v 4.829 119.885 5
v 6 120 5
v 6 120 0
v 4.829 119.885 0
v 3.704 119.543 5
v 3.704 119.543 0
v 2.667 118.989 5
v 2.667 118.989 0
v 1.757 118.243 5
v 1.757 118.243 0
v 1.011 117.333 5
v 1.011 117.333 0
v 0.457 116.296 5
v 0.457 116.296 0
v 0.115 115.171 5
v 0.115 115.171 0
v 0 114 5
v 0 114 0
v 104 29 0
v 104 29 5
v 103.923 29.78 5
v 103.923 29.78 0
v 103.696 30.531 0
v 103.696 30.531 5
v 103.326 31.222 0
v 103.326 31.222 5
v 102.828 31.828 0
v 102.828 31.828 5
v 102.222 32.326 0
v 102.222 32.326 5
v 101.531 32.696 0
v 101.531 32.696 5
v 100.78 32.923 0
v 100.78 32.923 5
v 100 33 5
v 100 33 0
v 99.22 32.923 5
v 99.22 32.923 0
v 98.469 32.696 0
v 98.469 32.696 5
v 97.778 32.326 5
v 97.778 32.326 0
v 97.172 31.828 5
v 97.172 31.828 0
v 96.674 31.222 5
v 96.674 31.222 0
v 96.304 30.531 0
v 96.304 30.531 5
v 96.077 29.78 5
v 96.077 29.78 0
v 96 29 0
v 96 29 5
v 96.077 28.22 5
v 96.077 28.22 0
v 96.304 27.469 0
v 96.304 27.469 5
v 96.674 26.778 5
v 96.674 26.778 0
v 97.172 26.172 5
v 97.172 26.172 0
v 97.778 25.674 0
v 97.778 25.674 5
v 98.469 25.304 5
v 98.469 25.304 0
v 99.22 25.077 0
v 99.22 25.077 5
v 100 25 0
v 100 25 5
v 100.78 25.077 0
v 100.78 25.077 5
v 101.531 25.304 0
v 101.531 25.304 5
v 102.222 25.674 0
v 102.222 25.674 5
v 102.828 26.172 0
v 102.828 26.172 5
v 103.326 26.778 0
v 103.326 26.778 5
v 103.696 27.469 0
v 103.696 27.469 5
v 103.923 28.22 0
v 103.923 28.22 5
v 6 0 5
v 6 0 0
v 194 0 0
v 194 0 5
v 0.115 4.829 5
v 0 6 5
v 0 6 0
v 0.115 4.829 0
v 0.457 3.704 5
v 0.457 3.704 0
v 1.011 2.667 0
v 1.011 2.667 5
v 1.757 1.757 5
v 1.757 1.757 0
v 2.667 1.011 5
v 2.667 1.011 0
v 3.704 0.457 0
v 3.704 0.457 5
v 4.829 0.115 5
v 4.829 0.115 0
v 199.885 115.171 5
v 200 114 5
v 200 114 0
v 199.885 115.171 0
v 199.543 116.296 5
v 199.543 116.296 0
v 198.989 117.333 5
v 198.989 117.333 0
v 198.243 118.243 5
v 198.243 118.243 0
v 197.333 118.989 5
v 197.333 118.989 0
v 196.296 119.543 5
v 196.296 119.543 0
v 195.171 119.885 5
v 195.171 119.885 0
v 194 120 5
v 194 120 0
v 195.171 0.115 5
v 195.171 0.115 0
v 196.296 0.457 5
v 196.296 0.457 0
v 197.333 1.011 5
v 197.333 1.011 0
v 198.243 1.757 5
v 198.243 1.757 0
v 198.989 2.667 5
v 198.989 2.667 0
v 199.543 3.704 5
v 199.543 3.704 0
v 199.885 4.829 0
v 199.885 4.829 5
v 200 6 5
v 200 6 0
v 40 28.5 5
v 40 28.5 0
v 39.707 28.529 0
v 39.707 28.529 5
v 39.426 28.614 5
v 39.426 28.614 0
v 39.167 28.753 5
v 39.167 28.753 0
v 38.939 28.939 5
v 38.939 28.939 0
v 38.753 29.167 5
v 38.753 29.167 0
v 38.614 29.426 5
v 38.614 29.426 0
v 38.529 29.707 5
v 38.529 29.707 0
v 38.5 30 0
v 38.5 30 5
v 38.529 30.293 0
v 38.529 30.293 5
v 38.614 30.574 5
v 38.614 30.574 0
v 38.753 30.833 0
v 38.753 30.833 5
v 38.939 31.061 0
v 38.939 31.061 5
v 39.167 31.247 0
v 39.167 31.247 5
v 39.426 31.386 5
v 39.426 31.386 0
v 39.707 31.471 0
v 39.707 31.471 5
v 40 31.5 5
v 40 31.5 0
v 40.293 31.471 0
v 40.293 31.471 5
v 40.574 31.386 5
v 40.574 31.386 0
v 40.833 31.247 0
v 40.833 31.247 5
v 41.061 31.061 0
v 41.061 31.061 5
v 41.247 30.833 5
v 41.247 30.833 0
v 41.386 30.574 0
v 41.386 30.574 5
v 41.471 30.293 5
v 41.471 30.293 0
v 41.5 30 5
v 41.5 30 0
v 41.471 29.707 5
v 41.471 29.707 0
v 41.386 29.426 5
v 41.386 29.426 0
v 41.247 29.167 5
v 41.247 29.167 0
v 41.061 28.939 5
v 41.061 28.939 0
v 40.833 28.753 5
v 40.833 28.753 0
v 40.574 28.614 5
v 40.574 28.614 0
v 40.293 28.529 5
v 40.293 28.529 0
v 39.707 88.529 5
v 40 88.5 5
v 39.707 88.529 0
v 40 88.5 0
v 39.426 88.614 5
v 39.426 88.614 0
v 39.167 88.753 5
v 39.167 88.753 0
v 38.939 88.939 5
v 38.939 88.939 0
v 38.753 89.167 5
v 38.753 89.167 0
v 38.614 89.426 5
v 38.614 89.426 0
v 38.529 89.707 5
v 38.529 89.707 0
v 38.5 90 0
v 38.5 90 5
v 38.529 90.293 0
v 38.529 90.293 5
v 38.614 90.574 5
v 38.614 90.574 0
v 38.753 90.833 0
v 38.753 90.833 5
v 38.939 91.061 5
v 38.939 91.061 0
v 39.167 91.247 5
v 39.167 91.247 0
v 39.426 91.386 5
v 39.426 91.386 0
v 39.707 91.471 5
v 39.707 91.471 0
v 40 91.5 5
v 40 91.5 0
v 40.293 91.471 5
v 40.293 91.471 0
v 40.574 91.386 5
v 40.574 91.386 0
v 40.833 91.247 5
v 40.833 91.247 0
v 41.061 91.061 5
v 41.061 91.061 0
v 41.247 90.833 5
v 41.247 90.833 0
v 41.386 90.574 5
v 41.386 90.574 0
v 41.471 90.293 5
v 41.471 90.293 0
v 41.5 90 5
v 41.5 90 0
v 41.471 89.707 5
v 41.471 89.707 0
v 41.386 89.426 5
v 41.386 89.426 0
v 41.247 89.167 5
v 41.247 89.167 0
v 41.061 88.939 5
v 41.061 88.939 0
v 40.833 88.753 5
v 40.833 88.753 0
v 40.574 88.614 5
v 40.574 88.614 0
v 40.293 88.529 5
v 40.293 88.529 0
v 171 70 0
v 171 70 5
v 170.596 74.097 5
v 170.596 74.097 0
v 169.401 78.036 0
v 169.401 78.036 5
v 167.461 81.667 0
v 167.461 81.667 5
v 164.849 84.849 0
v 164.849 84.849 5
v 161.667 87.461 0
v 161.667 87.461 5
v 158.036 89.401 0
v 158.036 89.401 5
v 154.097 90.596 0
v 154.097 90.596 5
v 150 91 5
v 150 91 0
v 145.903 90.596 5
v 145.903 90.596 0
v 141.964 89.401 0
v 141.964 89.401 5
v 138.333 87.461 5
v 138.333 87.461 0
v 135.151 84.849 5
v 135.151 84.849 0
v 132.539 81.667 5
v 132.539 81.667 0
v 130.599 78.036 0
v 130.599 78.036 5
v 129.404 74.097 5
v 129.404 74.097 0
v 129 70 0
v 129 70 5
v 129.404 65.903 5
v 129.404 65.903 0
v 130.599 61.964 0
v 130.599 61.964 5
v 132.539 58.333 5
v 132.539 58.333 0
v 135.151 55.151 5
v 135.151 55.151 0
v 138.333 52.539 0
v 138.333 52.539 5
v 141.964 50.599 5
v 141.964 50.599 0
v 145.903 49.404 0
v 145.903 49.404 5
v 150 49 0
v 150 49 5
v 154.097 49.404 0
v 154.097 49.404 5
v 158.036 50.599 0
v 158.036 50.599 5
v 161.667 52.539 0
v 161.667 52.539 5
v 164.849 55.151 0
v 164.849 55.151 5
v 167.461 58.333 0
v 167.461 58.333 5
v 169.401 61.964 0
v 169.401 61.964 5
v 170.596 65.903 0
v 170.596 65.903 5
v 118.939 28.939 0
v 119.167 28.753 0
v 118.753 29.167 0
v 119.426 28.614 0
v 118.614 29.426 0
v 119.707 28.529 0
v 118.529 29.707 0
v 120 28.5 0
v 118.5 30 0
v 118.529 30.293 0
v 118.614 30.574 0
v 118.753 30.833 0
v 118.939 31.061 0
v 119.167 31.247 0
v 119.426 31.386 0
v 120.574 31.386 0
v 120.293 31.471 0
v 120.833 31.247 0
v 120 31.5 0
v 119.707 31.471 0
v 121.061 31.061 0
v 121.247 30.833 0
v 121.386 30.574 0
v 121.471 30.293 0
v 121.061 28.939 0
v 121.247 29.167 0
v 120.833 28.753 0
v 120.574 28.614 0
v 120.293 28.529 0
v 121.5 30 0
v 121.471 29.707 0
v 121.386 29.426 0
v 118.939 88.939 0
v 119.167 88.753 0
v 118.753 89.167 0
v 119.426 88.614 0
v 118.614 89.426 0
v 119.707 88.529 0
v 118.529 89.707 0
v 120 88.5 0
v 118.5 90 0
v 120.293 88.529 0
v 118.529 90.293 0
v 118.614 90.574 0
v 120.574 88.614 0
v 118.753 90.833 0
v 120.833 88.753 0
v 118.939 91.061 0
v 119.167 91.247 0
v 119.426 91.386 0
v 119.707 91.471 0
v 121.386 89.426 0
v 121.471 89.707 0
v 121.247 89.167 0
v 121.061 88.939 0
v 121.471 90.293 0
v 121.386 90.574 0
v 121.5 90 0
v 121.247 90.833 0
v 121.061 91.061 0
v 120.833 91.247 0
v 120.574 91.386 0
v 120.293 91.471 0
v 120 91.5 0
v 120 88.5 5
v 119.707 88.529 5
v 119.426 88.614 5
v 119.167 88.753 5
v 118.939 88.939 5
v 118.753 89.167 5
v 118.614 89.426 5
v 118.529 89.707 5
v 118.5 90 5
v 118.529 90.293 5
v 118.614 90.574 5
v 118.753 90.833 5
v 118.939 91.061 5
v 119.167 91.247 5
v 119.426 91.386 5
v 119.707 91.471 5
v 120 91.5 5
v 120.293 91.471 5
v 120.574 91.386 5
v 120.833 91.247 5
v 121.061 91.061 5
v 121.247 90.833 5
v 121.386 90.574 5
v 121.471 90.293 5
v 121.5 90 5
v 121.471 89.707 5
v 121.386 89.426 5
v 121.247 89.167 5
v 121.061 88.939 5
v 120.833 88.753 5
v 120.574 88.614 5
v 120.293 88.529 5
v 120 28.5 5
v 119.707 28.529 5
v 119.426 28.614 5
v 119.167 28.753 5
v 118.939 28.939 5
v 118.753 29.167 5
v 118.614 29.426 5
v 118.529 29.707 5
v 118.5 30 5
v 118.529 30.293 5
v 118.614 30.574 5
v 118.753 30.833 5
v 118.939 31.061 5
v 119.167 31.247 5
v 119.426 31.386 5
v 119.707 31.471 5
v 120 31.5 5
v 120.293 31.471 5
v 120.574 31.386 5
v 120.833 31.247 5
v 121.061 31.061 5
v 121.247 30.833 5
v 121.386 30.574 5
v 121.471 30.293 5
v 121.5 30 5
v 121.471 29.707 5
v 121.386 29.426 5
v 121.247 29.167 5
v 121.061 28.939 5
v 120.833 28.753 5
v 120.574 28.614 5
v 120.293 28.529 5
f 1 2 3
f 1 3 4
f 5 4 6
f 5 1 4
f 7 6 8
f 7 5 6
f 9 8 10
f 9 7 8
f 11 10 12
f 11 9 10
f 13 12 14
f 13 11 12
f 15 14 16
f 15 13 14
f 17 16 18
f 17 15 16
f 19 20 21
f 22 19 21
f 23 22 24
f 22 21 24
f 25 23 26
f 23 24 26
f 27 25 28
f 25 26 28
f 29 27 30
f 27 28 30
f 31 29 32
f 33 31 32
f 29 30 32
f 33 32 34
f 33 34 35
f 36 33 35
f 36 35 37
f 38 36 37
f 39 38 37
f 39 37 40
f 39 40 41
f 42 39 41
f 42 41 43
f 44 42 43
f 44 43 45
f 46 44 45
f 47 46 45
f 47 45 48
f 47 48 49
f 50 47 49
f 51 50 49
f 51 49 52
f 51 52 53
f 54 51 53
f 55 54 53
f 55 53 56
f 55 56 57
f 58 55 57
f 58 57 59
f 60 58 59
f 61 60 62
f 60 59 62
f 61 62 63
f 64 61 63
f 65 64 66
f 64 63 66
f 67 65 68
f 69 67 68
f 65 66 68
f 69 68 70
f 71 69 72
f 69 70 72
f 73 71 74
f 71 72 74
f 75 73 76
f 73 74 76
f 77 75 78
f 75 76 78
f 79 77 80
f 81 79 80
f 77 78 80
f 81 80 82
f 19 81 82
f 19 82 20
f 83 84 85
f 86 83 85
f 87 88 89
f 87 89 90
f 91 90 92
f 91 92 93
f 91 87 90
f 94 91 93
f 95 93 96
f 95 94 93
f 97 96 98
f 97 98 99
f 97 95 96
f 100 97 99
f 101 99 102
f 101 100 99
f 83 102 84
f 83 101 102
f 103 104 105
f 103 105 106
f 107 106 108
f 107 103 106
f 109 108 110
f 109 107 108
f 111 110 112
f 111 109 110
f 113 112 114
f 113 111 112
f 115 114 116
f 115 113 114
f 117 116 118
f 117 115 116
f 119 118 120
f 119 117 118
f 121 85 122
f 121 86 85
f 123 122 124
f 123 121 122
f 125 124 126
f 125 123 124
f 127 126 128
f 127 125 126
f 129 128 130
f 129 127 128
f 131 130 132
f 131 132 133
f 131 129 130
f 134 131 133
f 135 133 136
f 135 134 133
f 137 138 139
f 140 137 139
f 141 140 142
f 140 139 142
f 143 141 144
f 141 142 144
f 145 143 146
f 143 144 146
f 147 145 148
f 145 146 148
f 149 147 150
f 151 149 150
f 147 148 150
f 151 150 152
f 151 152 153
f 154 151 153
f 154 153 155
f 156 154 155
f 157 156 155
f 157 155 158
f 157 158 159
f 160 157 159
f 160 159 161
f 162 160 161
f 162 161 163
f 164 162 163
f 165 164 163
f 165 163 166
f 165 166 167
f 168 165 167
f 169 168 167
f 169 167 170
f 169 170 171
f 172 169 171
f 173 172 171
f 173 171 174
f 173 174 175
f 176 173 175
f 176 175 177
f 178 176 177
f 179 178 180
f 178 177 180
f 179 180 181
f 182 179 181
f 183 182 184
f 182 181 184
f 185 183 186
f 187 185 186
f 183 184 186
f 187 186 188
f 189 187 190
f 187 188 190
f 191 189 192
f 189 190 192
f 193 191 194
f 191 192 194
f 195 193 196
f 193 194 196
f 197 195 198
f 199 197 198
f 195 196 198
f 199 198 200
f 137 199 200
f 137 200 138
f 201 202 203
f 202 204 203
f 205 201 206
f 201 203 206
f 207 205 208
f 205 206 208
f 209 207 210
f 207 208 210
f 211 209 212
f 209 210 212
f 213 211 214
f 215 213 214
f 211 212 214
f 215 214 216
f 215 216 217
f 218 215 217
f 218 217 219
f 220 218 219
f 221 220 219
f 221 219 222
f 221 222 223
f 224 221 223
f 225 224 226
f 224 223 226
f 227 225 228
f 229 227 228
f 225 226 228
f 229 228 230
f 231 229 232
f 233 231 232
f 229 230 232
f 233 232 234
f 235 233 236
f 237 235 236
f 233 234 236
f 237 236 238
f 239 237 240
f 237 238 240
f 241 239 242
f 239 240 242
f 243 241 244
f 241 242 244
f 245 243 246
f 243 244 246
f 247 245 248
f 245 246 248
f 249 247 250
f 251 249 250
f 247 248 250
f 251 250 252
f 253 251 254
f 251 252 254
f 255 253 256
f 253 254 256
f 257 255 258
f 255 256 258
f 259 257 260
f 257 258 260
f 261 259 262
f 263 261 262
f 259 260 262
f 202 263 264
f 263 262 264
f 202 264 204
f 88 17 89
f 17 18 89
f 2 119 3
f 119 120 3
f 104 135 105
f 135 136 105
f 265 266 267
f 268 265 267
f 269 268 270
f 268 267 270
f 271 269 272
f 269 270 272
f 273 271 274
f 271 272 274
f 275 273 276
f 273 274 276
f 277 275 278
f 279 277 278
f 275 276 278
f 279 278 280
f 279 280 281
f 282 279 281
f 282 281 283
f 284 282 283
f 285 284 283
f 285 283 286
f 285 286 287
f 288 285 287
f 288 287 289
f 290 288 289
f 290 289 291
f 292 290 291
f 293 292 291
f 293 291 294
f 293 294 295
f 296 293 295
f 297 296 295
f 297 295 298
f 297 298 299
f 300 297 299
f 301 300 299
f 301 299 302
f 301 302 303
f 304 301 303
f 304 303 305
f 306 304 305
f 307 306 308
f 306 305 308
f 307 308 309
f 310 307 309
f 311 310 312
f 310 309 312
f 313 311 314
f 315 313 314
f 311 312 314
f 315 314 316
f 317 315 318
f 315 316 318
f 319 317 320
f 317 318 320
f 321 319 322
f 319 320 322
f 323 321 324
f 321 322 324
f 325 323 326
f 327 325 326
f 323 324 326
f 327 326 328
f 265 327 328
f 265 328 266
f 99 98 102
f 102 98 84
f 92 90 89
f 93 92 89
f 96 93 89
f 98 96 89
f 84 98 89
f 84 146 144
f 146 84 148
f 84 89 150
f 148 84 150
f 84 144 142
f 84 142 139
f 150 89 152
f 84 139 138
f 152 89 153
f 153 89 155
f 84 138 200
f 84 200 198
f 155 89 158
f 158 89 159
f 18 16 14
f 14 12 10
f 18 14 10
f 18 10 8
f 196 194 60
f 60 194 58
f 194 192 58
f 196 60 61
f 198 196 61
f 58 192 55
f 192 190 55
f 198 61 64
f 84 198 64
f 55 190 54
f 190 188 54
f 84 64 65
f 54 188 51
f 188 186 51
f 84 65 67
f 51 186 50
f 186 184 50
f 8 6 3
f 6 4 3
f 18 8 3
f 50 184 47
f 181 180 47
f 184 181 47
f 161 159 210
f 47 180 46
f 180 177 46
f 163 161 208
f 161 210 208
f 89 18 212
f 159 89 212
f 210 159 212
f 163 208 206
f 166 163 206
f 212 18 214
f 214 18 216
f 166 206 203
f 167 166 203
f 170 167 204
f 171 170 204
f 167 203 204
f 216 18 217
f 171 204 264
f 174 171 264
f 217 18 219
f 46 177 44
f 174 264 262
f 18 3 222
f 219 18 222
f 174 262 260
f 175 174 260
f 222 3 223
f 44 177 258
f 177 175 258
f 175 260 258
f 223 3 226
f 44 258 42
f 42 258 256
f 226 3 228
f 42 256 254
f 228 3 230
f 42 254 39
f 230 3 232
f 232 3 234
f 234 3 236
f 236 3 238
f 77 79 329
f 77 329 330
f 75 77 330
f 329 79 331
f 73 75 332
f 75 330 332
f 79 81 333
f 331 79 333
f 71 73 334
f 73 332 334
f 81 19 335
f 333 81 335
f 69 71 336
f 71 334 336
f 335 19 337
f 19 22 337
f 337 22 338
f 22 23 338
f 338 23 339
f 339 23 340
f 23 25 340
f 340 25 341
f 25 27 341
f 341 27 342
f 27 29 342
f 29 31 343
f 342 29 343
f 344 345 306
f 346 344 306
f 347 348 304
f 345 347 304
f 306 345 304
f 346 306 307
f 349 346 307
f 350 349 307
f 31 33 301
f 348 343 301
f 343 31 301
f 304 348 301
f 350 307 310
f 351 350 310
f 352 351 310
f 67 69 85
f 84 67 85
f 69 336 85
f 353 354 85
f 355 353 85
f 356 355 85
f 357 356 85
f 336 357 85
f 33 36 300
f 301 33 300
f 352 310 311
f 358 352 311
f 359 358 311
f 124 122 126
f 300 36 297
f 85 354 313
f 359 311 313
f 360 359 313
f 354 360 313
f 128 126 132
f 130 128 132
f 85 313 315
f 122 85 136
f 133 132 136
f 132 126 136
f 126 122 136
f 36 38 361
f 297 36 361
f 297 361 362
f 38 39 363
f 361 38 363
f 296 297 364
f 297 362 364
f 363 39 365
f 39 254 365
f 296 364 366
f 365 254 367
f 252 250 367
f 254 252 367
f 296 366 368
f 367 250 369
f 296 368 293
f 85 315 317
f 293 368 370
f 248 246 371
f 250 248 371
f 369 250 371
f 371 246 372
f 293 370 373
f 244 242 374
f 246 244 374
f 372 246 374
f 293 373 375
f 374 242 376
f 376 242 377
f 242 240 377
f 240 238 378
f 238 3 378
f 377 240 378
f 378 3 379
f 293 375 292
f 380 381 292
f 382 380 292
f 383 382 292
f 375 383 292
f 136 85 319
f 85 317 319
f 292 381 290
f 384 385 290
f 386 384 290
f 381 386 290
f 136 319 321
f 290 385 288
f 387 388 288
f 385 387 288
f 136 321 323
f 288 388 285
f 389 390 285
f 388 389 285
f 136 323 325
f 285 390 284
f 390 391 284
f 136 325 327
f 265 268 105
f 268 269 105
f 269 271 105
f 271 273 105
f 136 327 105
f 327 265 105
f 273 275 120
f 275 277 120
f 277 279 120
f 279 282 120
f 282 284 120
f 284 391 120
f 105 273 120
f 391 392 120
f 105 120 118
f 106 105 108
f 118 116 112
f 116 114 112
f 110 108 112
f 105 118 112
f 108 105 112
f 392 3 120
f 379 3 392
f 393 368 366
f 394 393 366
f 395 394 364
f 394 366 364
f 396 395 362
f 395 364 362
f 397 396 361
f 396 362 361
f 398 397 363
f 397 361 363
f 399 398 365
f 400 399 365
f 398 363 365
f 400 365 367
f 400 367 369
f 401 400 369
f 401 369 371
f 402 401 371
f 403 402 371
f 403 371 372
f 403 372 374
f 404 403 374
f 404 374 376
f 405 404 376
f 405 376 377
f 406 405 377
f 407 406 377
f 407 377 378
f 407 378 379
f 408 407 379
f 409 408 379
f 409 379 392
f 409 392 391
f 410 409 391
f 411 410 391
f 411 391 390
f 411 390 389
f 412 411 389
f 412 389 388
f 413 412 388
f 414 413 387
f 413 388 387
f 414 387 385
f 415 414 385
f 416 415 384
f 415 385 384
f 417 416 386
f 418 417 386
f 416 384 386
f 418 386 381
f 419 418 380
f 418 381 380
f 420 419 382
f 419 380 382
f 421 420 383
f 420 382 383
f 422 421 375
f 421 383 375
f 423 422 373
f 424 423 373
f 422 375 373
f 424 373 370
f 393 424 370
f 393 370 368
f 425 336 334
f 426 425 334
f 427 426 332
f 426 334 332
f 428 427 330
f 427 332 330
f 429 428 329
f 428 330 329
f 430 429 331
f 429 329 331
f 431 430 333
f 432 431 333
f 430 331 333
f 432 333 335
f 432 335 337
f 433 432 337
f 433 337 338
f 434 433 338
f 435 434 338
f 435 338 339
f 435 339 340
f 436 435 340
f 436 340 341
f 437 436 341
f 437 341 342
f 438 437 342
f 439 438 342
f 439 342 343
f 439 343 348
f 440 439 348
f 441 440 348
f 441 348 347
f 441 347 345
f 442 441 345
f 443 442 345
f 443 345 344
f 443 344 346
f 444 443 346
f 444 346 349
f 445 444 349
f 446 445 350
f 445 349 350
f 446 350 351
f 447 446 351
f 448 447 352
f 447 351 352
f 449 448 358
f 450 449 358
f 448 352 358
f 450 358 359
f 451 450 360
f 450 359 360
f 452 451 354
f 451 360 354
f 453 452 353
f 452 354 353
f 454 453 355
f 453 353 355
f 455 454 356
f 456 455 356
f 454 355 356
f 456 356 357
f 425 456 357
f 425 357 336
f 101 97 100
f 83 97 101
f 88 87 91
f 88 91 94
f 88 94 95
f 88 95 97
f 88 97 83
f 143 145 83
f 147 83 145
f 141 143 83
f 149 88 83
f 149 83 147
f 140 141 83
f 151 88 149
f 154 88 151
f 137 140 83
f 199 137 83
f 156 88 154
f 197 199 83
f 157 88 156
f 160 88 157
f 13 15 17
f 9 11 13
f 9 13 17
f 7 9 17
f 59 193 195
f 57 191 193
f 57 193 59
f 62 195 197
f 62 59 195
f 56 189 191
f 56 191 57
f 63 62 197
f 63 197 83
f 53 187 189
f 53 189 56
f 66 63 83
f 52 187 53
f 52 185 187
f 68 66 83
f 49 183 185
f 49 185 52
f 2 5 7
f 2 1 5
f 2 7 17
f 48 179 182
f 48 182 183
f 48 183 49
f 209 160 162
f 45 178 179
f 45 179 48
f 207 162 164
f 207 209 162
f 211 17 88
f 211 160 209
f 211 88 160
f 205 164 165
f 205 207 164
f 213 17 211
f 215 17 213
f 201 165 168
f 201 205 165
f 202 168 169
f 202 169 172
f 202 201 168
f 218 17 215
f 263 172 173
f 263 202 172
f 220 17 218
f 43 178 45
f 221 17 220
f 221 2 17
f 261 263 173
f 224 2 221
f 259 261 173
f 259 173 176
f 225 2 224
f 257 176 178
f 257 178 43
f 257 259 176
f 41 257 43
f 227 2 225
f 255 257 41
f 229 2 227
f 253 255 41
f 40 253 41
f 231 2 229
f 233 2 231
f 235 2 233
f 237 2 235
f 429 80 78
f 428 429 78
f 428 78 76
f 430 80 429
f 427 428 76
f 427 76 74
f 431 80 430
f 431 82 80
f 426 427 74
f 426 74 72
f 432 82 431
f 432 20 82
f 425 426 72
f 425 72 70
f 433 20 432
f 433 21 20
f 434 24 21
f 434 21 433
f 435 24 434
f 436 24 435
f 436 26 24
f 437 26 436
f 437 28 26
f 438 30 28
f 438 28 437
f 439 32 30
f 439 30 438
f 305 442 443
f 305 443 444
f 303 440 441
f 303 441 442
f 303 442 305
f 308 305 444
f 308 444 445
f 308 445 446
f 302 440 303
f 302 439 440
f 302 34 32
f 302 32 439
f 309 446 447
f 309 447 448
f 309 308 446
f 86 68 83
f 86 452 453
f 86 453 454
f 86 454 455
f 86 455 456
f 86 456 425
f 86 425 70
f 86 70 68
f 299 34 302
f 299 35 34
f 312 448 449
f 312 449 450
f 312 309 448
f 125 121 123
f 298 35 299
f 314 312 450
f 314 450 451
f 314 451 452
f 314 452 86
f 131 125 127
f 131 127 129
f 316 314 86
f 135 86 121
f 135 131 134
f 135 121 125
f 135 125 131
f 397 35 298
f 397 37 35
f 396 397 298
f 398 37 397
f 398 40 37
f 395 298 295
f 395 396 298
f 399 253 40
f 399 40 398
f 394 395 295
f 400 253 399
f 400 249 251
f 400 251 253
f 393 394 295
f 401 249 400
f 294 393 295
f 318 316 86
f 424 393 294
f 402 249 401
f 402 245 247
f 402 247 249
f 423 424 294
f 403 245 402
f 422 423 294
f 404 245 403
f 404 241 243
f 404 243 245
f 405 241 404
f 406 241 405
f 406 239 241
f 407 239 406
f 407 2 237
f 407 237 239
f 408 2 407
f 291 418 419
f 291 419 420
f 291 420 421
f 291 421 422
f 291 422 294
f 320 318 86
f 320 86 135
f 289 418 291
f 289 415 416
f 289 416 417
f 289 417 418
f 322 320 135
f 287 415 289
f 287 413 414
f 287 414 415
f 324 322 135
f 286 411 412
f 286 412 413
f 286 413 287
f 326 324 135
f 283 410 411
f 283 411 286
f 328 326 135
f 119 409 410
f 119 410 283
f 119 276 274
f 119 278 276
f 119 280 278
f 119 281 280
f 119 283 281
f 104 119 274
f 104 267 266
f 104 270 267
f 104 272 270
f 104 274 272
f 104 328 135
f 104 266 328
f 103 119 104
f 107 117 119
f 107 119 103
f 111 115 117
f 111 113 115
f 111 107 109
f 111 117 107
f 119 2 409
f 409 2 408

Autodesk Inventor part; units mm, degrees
ref_plane "YZ Plane" through (0, 0, 0) normal (1, 0, 0) x (0, 1, 0)
ref_plane "XZ Plane" through (0, 0, 0) normal (0, 1, 0) x (-1, 0, 0)
ref_plane "XY Plane" through (0, 0, 0) normal (0, 0, 1) x (1, 0, 0)
sketch "Sketch1" plane through (0, 0, 0) normal (0, 0, 1) x (1, 0, 0)
  line L0 (0, 0) -> (200, 0)
  line L1 (200, 0) -> (200, 120)
  line L2 (200, 120) -> (0, 120)
  line L3 (0, 120) -> (0, 0)
  dimension "width" = 200
  dimension "height" = 120
extrude "Extrusion1" add sketch "Sketch1" along normal blind 5
sketch "Sketch2" plane through (0, 0, 5) normal (0, 0, 1) x (1, 0, 0)
  circle A0 centre (150, 70) radius 37
  line L0 (85, 44) -> (115, 44)
  line L1 (115, 44) -> (115, 14)
  line L2 (115, 14) -> (85, 14)
  line L3 (85, 14) -> (85, 44)
  line L4 (0, 120) -> (0, 0) projected
  line L5 (0, 0) -> (200, 0) projected
  circle A1 centre (100, 29) radius 4
  circle A2 centre (150, 70) radius 21
  dimension "d4" = 74
  dimension "d5" = 30
  dimension "d6" = 30
  dimension "d7" = 85
  dimension "d8" = 70
  dimension "d9" = 150
  dimension "d10" = 8
  dimension "d11" = 42
extrude "Extrusion2" cut sketch "Sketch2" against normal blind 8 contours A1 | A2
hole "Hole1" at (40, 90, 5) direction (0, 0, -1) diameter 3 end through all
pattern_linear "Rectangular Pattern1" count 2 spacing 80 along (1, 0, 0) count 2 spacing 60 along (0, -1, 0) of "Hole1"
fillet "Fillet1" radius 6 4 edges at (0, 120, 2.5) (0, 0, 2.5) (200, 0, 2.5) (200, 120, 2.5)
properties part number "capac 2"
